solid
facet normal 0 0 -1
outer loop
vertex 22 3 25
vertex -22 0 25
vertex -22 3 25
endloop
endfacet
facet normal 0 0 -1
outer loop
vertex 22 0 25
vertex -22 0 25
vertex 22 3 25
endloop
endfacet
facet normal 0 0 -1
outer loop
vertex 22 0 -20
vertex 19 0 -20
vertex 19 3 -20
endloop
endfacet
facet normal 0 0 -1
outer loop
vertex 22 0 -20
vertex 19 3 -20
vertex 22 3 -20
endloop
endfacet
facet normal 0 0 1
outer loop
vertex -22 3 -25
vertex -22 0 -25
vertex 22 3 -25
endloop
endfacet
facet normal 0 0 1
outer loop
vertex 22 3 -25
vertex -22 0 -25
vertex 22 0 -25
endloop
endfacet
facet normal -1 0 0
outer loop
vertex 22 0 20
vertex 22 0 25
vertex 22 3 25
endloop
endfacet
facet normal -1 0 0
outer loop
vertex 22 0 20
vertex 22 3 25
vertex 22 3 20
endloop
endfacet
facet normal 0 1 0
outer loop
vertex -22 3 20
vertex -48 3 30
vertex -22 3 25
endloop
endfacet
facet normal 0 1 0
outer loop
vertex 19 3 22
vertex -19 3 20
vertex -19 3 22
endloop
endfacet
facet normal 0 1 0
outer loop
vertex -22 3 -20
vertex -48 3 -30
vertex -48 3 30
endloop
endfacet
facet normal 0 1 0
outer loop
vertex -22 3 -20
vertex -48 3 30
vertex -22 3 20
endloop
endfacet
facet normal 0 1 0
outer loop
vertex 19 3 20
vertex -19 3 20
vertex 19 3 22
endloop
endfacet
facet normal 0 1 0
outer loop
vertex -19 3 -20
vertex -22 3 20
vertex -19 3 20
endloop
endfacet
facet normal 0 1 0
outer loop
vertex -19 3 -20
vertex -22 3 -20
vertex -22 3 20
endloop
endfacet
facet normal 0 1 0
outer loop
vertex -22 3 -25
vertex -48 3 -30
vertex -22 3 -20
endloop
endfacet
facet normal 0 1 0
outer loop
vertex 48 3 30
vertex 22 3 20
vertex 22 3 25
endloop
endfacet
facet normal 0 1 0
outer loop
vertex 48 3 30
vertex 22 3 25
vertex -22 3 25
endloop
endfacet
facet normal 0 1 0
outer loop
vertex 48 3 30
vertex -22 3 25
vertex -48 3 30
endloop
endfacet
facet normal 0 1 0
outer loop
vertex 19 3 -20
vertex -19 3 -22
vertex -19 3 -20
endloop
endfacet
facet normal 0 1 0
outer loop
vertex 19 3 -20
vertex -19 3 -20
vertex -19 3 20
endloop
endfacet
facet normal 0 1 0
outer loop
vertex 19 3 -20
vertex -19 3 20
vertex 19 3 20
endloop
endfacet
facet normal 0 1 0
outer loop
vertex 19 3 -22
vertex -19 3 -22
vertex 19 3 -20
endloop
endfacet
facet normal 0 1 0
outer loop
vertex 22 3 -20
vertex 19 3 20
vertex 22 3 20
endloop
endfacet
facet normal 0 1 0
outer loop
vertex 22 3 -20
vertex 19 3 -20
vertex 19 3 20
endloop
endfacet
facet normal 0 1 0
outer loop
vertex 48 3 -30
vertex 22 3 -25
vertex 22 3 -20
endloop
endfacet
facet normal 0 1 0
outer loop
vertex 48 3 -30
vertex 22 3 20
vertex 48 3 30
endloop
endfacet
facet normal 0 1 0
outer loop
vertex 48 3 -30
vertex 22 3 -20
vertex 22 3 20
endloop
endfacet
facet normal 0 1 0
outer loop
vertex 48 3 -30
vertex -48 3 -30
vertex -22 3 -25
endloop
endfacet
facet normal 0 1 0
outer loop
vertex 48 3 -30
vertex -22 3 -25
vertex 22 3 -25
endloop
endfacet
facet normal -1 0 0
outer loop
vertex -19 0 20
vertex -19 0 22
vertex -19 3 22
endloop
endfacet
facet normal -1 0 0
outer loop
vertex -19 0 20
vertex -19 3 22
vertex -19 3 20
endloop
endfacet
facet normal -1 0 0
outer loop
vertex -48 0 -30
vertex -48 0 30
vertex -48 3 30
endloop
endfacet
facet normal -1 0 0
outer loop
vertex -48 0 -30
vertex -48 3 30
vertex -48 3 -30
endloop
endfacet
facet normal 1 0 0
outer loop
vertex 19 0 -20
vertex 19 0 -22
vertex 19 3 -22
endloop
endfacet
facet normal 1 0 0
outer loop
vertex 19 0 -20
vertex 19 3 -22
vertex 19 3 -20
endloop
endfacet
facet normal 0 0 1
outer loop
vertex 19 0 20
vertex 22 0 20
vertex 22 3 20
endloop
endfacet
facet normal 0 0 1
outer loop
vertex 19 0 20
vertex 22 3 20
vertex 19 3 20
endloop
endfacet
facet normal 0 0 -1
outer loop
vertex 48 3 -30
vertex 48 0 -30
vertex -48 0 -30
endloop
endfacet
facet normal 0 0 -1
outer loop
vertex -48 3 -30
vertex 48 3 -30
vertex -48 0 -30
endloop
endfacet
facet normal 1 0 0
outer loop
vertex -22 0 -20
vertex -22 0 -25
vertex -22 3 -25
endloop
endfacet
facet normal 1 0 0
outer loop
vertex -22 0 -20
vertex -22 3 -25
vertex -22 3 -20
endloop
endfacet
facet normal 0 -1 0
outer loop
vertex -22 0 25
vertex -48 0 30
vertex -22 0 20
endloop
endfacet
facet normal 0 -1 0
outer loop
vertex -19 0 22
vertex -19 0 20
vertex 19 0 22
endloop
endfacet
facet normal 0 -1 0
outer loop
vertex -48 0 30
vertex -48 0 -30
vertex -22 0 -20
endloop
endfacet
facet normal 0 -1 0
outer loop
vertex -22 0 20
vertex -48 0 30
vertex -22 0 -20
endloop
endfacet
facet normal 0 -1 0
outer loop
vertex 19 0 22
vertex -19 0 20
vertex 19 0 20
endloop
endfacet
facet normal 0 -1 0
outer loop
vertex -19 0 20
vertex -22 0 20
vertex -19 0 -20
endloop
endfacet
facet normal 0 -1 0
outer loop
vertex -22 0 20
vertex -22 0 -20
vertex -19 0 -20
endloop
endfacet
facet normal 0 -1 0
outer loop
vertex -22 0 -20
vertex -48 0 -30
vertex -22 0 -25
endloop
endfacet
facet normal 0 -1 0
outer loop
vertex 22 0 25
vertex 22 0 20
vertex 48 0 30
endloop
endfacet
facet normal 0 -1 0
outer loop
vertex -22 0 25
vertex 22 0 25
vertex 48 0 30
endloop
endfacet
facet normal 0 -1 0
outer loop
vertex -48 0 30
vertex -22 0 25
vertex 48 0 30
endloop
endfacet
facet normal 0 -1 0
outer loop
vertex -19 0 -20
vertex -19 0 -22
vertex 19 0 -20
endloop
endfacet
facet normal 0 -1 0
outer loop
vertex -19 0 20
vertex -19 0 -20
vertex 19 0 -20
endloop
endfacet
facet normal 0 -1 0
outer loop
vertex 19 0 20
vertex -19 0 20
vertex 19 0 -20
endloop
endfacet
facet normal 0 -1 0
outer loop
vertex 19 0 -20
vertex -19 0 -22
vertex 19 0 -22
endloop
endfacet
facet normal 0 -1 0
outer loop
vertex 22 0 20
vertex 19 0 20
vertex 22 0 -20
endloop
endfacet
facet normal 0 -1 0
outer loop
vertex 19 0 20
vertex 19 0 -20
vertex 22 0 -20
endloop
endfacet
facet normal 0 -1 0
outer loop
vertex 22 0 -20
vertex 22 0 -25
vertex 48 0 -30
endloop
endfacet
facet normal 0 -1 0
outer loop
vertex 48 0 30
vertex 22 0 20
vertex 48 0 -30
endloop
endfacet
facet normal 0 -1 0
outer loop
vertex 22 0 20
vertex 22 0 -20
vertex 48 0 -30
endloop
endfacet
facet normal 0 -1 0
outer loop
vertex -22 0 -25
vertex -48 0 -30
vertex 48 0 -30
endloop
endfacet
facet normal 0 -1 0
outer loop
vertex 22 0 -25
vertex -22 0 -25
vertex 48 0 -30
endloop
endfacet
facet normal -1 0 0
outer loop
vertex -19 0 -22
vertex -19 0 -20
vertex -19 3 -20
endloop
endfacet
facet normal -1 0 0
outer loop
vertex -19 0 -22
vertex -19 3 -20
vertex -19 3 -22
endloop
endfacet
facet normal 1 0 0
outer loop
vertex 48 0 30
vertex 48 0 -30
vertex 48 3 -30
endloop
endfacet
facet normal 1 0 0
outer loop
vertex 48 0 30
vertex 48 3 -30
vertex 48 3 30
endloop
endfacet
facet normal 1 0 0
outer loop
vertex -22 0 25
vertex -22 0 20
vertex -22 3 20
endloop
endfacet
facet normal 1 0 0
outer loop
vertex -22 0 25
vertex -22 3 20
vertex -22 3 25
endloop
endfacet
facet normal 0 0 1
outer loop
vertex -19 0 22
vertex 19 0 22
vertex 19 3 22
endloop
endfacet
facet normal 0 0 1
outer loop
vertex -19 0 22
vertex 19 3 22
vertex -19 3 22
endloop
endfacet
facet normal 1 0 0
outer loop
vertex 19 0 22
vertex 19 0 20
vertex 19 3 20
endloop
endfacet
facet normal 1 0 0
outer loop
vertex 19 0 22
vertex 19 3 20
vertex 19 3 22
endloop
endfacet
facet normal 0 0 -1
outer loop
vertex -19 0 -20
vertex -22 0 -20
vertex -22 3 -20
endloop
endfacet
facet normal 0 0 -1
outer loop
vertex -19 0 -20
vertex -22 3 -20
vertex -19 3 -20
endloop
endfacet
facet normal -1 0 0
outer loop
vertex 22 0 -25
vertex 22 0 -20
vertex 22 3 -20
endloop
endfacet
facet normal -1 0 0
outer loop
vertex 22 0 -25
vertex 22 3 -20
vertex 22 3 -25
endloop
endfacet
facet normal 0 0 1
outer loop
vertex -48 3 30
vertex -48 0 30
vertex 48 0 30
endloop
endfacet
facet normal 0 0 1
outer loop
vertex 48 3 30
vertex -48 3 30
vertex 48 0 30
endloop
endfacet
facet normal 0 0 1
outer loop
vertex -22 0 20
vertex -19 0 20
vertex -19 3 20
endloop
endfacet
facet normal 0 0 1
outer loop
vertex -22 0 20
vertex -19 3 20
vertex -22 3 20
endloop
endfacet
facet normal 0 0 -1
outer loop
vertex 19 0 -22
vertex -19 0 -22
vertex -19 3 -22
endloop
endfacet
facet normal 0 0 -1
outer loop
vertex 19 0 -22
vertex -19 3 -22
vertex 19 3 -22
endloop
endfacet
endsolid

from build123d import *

# Parameters (mm, degrees)
SKETCH1_W           = 44
SKETCH1_H           = 5
BOSS_EXTRUDE1_DEPTH = 3


with BuildPart() as part:
    # Sketch1 → Boss-Extrude1 (new body)
    with BuildSketch(Plane(origin=(0, 0, 0), x_dir=(1, 0, 0), z_dir=(0, 1, 0))):
        with Locations((0, 27.5)):
            Rectangle(SKETCH1_W, SKETCH1_H)
        with Locations((0, -27.5)):
            Rectangle(SKETCH1_W, SKETCH1_H)
        Polygon((-22, -30), (-48, -30), (-48, 30), (-22, 30), (-22, 20), (-19, 20), (-19, 22), (19, 22), (19, 20), (22, 20), (22, 30), (48, 30), (48, -30), (22, -30), (22, -20), (19, -20), (19, -22), (-19, -22), (-19, -20), (-22, -20), align=None)
    extrude(amount=BOSS_EXTRUDE1_DEPTH)


solid = part.part
